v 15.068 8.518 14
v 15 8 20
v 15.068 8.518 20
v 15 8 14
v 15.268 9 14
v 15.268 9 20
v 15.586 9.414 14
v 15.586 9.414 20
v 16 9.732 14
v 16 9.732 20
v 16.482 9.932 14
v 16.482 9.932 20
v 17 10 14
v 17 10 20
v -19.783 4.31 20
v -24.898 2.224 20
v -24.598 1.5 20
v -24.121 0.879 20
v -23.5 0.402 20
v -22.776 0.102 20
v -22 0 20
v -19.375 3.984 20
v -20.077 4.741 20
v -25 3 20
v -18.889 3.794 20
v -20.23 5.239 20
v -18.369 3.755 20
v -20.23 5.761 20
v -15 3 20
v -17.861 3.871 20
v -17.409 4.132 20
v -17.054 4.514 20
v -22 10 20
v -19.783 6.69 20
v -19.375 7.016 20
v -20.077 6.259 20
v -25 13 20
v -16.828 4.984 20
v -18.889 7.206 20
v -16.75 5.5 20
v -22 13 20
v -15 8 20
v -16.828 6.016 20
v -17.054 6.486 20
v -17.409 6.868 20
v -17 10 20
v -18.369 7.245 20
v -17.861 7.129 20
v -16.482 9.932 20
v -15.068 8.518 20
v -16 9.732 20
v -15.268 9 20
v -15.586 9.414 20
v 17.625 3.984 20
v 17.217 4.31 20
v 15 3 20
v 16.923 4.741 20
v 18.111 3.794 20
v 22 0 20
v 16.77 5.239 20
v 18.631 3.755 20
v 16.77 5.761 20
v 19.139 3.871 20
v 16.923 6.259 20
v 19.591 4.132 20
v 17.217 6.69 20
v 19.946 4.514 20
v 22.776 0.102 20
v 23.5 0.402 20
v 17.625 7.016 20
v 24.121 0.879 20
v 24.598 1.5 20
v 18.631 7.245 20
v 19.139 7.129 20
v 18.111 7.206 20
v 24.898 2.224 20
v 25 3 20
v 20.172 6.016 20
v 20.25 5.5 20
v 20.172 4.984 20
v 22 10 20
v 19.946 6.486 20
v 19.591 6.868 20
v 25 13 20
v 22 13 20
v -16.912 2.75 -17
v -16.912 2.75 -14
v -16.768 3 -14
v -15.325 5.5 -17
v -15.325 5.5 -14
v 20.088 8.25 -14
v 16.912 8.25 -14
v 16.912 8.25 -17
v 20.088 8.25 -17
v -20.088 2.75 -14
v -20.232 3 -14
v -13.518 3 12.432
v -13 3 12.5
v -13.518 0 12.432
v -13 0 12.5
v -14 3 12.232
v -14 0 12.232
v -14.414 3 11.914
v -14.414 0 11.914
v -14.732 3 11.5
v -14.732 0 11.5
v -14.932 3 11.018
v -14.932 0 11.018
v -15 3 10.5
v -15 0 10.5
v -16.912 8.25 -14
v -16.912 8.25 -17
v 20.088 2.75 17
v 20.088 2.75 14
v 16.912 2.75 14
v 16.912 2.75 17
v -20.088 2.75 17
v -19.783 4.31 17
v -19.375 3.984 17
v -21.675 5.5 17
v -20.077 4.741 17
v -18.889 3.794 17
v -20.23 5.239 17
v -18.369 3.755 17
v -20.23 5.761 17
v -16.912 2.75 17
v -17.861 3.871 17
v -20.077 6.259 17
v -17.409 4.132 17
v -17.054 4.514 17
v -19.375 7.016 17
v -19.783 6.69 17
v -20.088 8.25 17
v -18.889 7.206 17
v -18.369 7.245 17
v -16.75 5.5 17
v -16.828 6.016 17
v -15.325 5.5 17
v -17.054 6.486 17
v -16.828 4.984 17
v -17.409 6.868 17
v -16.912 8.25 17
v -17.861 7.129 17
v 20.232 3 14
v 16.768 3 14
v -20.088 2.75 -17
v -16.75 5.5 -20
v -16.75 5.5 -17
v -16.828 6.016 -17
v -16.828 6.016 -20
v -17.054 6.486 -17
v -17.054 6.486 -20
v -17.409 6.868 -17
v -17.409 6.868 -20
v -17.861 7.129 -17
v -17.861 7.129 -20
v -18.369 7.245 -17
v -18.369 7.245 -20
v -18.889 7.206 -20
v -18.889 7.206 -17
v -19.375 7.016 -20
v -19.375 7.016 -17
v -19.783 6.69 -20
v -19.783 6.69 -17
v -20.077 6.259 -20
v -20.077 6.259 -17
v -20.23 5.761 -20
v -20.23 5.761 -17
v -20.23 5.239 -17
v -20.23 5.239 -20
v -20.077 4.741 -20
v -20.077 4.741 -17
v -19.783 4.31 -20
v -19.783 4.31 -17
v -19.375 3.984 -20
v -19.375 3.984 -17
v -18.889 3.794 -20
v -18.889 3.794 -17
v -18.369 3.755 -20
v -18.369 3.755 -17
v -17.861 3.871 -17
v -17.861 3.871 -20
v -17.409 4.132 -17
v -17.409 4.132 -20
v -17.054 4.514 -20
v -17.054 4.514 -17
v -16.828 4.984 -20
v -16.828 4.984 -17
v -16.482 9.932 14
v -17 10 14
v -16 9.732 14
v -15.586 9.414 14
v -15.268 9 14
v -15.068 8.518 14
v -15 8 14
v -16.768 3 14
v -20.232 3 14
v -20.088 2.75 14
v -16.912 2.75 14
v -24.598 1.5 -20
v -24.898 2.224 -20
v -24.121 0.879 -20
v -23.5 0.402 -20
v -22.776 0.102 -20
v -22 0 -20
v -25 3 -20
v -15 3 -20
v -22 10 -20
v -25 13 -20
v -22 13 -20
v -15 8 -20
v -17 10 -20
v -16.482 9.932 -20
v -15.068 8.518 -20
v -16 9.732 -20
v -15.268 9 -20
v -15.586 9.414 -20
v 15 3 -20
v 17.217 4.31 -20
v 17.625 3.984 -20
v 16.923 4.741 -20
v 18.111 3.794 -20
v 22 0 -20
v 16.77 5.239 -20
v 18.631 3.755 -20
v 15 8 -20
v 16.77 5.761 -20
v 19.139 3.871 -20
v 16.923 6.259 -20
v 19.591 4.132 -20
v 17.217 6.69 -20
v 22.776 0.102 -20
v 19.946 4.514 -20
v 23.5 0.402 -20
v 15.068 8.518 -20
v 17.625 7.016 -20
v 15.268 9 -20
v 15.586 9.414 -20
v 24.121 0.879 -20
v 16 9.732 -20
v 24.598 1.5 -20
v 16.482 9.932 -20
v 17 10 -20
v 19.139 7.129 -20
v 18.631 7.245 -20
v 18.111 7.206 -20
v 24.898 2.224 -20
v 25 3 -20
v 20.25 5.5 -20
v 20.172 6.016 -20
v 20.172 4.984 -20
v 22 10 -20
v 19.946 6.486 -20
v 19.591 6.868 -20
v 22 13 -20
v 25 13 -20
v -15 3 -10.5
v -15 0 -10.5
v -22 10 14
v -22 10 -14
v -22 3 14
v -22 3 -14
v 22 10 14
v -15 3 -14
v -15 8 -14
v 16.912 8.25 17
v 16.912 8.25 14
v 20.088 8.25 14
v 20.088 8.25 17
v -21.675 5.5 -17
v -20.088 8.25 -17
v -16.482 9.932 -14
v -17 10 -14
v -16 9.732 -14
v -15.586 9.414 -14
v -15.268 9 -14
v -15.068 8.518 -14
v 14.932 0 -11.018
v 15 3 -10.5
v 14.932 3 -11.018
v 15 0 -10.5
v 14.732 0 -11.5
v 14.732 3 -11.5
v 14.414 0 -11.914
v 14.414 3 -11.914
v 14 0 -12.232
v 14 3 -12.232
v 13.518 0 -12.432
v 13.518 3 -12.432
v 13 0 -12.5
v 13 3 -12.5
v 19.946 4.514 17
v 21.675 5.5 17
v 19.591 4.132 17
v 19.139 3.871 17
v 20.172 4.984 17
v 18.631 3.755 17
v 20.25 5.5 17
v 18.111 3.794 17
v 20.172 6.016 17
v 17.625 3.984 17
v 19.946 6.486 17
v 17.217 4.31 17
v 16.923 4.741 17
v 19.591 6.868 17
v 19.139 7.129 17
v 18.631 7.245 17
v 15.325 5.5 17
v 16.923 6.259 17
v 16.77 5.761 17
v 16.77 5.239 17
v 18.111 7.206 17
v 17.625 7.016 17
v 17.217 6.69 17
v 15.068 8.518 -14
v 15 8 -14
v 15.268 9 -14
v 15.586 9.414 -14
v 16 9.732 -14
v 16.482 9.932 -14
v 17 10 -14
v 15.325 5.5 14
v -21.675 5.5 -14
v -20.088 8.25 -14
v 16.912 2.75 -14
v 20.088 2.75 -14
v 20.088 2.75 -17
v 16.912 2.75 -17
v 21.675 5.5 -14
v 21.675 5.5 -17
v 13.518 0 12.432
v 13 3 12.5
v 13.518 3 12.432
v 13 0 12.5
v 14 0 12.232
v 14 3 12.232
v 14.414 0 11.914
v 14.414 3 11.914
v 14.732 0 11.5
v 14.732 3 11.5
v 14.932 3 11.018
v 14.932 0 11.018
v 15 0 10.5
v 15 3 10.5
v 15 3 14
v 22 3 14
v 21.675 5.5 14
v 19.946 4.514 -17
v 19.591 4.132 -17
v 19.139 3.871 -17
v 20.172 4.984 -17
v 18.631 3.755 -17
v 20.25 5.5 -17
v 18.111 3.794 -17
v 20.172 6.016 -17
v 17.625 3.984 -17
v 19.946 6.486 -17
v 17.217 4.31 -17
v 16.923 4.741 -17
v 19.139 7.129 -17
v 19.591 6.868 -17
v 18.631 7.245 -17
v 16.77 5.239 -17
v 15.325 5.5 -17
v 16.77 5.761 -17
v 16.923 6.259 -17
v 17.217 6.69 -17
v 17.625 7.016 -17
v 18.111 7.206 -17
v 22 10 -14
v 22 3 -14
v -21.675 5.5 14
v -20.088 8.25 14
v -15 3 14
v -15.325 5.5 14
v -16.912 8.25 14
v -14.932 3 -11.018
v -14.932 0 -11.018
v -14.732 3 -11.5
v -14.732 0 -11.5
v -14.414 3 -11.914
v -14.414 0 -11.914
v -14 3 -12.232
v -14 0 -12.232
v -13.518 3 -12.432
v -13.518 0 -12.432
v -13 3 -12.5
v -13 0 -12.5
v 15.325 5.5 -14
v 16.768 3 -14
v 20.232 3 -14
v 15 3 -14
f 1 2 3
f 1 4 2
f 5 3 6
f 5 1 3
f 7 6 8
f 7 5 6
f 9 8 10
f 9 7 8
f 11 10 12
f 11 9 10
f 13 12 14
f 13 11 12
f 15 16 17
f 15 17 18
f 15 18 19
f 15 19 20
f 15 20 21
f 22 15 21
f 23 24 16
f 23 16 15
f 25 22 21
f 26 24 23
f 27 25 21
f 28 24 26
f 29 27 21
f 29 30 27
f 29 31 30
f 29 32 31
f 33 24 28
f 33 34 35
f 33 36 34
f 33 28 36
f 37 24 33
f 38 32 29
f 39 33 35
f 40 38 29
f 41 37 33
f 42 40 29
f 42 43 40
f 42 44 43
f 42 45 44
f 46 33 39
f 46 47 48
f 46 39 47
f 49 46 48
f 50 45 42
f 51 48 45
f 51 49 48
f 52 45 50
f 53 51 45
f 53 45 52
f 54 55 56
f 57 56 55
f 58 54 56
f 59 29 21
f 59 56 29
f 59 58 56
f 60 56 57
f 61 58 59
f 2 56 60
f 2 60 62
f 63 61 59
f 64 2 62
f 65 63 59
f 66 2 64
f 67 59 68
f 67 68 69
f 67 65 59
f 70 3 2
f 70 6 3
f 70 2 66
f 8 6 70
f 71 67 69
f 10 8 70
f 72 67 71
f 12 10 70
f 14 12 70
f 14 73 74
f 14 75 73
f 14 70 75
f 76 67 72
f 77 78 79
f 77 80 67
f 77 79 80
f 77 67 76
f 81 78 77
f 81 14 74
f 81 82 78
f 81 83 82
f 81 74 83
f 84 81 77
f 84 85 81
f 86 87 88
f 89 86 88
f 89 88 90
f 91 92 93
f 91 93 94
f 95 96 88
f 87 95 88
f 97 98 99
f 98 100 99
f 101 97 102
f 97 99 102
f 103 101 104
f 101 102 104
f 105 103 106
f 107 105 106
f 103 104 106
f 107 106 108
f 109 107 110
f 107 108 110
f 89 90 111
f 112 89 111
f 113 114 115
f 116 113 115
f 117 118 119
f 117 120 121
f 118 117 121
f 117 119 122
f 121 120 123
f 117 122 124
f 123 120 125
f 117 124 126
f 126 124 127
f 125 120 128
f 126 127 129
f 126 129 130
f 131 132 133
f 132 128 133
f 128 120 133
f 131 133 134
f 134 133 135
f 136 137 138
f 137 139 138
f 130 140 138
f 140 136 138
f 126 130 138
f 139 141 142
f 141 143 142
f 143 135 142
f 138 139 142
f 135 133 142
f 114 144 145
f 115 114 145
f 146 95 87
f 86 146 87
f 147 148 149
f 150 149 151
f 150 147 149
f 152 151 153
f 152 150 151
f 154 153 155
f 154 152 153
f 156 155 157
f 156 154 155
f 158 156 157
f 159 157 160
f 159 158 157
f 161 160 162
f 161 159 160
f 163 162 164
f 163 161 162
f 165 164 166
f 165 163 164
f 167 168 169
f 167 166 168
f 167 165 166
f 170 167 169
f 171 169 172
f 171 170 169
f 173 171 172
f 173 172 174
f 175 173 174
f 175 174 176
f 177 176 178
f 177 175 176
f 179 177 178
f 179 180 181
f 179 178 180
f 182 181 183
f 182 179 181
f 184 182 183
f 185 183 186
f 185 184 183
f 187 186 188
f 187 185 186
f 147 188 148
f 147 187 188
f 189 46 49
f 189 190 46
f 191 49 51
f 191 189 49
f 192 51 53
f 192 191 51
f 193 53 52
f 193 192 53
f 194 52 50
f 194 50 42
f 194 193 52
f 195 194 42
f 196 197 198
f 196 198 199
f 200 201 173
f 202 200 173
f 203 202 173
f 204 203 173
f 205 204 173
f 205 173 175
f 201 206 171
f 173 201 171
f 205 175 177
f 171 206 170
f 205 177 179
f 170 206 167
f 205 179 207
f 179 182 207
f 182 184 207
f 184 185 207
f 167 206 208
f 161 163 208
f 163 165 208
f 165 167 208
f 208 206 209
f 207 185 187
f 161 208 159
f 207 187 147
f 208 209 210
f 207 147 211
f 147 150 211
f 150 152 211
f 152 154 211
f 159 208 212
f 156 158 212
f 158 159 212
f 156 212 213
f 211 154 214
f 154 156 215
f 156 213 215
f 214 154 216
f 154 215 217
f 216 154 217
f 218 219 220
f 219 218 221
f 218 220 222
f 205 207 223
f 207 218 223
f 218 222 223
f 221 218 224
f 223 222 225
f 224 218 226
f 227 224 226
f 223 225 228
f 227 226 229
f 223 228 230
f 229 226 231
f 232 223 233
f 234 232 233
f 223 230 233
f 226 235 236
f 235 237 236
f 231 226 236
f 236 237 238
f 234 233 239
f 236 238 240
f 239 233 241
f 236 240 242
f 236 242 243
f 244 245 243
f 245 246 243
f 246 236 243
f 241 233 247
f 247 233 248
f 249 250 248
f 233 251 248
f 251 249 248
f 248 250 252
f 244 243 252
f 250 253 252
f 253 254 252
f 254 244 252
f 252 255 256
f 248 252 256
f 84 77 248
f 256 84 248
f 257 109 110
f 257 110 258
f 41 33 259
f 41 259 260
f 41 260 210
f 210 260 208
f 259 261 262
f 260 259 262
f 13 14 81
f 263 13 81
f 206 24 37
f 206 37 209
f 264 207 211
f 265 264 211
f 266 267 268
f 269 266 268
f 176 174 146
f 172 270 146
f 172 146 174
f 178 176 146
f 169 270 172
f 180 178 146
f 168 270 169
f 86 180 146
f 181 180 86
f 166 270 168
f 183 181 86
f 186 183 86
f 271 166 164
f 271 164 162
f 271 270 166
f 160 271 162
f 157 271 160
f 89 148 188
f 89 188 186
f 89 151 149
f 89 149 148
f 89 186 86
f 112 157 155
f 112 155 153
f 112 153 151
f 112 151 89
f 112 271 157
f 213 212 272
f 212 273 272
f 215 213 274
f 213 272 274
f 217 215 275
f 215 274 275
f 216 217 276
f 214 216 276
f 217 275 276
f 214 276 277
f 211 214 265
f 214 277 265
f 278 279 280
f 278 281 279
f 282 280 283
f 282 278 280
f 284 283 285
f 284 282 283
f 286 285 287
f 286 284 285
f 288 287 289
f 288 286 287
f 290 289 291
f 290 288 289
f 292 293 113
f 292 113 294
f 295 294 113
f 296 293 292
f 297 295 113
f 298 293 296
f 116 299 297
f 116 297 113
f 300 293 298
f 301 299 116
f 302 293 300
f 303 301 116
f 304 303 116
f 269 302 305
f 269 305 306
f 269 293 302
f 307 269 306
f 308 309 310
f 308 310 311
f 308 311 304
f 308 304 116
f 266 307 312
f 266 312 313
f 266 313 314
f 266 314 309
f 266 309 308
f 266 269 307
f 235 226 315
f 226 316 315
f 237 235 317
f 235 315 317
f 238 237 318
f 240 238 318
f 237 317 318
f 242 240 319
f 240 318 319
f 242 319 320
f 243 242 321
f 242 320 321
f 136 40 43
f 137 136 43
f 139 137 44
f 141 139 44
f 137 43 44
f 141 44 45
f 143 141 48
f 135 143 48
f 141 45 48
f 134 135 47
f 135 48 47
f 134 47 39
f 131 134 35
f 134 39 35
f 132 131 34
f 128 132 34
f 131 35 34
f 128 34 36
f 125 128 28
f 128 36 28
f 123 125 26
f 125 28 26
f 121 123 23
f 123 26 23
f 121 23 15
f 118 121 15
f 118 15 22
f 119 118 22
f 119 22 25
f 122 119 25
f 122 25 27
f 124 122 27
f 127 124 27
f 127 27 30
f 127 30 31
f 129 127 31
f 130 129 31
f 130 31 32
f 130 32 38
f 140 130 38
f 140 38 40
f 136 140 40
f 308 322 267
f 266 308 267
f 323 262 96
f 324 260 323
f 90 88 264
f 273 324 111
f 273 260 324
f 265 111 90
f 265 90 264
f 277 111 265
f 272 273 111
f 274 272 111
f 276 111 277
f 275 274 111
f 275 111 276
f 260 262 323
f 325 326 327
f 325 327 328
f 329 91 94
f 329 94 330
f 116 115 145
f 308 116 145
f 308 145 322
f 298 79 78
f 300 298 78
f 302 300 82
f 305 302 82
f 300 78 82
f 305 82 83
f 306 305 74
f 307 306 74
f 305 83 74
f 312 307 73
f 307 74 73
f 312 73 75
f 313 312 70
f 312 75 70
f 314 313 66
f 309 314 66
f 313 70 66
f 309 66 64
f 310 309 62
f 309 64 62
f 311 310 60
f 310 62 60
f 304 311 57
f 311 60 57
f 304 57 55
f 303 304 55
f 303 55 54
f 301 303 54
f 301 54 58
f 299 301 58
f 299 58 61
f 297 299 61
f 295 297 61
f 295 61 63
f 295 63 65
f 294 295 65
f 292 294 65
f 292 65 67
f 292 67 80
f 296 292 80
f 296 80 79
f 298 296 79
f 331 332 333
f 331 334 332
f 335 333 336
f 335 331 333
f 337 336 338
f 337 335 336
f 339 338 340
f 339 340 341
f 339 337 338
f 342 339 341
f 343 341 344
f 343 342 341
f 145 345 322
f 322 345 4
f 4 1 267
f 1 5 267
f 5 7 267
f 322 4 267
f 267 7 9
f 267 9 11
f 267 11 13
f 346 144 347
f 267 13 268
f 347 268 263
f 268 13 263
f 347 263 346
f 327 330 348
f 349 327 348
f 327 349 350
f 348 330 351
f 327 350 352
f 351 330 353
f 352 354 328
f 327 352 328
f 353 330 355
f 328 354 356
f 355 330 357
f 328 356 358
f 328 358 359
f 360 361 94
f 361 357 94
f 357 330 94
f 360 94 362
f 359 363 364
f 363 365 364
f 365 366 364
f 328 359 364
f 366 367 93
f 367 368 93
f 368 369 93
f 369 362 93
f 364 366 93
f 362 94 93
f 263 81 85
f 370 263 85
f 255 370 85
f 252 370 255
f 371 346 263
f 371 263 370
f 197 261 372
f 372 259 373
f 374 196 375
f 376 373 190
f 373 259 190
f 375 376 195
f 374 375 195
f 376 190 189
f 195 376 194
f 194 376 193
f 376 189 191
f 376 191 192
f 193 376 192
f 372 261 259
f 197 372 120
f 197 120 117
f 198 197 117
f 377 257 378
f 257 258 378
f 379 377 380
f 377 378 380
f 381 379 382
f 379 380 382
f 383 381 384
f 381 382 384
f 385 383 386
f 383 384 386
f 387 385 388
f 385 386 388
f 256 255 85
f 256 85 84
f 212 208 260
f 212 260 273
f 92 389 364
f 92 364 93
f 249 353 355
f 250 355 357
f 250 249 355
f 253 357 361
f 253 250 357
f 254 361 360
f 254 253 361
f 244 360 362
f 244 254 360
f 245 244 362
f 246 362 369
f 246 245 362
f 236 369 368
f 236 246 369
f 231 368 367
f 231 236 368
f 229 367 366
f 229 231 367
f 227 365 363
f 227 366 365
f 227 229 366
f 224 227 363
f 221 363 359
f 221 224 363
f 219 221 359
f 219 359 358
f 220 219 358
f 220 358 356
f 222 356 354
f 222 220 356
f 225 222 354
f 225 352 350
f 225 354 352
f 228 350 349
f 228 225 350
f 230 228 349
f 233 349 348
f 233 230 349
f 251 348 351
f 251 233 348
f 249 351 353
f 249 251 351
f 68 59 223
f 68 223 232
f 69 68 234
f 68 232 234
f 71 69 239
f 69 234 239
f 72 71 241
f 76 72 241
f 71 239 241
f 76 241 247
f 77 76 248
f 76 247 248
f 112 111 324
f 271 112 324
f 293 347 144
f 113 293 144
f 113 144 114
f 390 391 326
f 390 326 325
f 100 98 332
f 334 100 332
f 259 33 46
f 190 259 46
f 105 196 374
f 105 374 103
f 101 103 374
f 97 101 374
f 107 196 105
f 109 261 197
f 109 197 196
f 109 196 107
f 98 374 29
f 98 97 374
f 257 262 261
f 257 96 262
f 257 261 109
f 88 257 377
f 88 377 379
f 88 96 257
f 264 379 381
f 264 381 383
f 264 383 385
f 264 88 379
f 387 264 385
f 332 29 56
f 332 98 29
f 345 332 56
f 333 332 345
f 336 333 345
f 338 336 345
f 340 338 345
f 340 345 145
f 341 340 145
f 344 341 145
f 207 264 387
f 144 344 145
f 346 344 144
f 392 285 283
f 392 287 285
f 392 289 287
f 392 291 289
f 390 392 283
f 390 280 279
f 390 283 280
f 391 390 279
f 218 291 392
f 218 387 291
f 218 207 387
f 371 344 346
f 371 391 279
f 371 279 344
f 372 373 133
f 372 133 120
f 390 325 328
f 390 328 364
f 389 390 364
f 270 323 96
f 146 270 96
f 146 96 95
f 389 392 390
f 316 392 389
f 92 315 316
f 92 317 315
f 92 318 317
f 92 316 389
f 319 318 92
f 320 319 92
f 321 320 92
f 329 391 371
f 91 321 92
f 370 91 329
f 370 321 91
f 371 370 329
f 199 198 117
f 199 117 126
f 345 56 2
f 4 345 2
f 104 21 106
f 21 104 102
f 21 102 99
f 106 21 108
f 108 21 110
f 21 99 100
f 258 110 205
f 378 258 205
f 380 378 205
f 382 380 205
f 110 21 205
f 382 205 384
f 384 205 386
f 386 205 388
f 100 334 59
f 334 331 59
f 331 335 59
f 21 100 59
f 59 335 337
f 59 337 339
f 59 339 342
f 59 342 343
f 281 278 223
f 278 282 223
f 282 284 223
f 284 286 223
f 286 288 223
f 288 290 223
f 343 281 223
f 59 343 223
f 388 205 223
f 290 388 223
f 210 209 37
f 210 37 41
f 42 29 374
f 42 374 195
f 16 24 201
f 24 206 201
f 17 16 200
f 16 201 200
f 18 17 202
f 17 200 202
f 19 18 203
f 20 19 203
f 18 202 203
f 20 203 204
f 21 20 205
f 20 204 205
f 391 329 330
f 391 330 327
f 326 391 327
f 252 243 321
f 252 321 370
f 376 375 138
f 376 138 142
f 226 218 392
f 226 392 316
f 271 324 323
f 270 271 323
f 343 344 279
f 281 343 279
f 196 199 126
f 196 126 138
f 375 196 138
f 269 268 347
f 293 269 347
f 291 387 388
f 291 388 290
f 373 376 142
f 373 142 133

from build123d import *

# Parameters (mm, degrees)
SKETCH1_W            = 50
SKETCH1_H            = 40
BOSS_EXTRUDE1_DEPTH  = 3
SKETCH2_W            = 30
SKETCH2_H            = 25
CUT_EXTRUDE1_DEPTH   = 4
SKETCH3_W            = 3
SKETCH3_H            = 40
BOSS_EXTRUDE2_DEPTH  = 10
SKETCH4_W            = 7
SKETCH4_H            = 7
BOSS_EXTRUDE3_DEPTH  = 6
SKETCH5_R            = 1.75
CUT_EXTRUDE2_DEPTH   = 41
CUT_EXTRUDE3_DEPTH   = 3
MIRROR3_COPY_1_DEPTH = 3
FILLET1_R            = 3
FILLET2_R            = 2
FILLET3_R            = 2


with BuildPart() as part:
    # Sketch1 → Boss-Extrude1 (new body)
    with BuildSketch(Plane(origin=(0, 0, 0), x_dir=(1, 0, 0), z_dir=(0, 1, 0))):
        Rectangle(SKETCH1_W, SKETCH1_H)
    extrude(amount=BOSS_EXTRUDE1_DEPTH)

    # Sketch2 → Cut-Extrude1 (cut, through all)
    with BuildSketch(Plane(origin=(0, 3, 0), x_dir=(1, 0, 0), z_dir=(0, 1, 0))):
        Rectangle(SKETCH2_W, SKETCH2_H)
    extrude(amount=-CUT_EXTRUDE1_DEPTH, mode=Mode.SUBTRACT)

    # Sketch3 → Boss-Extrude2 (add)
    with BuildSketch(Plane(origin=(0, 3, 0), x_dir=(1, 0, 0), z_dir=(0, 1, 0))):
        with Locations((-23.5, 0)):
            Rectangle(SKETCH3_W, SKETCH3_H)
        with Locations((23.5, 0)):
            Rectangle(SKETCH3_W, SKETCH3_H)
    extrude(amount=BOSS_EXTRUDE2_DEPTH)

    # Sketch4 → Boss-Extrude3 (add)
    with BuildSketch(Plane.XY.offset(20)):
        with Locations((-18.5, 6.5)):
            Rectangle(SKETCH4_W, SKETCH4_H)
        with Locations((18.5, 6.5)):
            Rectangle(SKETCH4_W, SKETCH4_H)
    boss_extrude3 = extrude(amount=-BOSS_EXTRUDE3_DEPTH)

    # Sketch5 → Cut-Extrude2 (cut, through all)
    with BuildSketch(Plane.XY.offset(20)):
        with Locations((-18.5, 5.5)):
            Circle(SKETCH5_R)
        with Locations((18.5, 5.5)):
            Circle(SKETCH5_R)
    cut_extrude2 = extrude(amount=-CUT_EXTRUDE2_DEPTH, mode=Mode.SUBTRACT)

    # Mirror1: Boss-Extrude3, Cut-Extrude2 across plane
    add(boss_extrude3.mirror(Plane.XY))
    add(cut_extrude2.mirror(Plane.XY), mode=Mode.SUBTRACT)

    # Sketch6 → Cut-Extrude3 (cut)
    with BuildSketch(Plane.XY.offset(-14)):
        Polygon((-15.324573519, 5.5), (-16.91228676, 8.25), (-20.08771324, 8.25), (-21.675426481, 5.5), (-20.08771324, 2.75), (-16.91228676, 2.75), align=None)
    cut_extrude3 = extrude(amount=-CUT_EXTRUDE3_DEPTH, mode=Mode.SUBTRACT)

    # Mirror2: Cut-Extrude3 across plane
    add(cut_extrude3.mirror(Plane(origin=(0, 0, 0), x_dir=(0, 0, 1), z_dir=(1, 0, 0))), mode=Mode.SUBTRACT)

    # Mirror3: Cut-Extrude3 across plane
    add(cut_extrude3.mirror(Plane.XY), mode=Mode.SUBTRACT)

    # Mirror3 copy 1 sketch → Mirror3 copy 1 (cut)
    with BuildSketch(Plane(origin=(0, 0, 14), x_dir=(-1, 0, 0), z_dir=(0, 0, -1))):
        Polygon((-15.324573519, 5.5), (-16.91228676, 8.25), (-20.08771324, 8.25), (-21.675426481, 5.5), (-20.08771324, 2.75), (-16.91228676, 2.75), align=None)
    extrude(amount=-MIRROR3_COPY_1_DEPTH, mode=Mode.SUBTRACT)

    # Fillet1
    fillet1_edges = [part.edges().sort_by_distance(p)[0] for p in [
        (-25, 0, 0),
        (25, 0, 0),
    ]]
    fillet(fillet1_edges, radius=FILLET1_R)

    # Fillet2
    fillet2_edges = [part.edges().sort_by_distance(p)[0] for p in [
        (15, 10, -17),
        (-15, 10, 17),
        (15, 10, 17),
        (-15, 10, -17),
    ]]
    fillet(fillet2_edges, radius=FILLET2_R)

    # Fillet3
    fillet3_edges = [part.edges().sort_by_distance(p)[0] for p in [
        (-15, 1.5, 12.5),
        (-15, 1.5, -12.5),
        (15, 1.5, -12.5),
        (15, 1.5, 12.5),
    ]]
    fillet(fillet3_edges, radius=FILLET3_R)


solid = part.part
